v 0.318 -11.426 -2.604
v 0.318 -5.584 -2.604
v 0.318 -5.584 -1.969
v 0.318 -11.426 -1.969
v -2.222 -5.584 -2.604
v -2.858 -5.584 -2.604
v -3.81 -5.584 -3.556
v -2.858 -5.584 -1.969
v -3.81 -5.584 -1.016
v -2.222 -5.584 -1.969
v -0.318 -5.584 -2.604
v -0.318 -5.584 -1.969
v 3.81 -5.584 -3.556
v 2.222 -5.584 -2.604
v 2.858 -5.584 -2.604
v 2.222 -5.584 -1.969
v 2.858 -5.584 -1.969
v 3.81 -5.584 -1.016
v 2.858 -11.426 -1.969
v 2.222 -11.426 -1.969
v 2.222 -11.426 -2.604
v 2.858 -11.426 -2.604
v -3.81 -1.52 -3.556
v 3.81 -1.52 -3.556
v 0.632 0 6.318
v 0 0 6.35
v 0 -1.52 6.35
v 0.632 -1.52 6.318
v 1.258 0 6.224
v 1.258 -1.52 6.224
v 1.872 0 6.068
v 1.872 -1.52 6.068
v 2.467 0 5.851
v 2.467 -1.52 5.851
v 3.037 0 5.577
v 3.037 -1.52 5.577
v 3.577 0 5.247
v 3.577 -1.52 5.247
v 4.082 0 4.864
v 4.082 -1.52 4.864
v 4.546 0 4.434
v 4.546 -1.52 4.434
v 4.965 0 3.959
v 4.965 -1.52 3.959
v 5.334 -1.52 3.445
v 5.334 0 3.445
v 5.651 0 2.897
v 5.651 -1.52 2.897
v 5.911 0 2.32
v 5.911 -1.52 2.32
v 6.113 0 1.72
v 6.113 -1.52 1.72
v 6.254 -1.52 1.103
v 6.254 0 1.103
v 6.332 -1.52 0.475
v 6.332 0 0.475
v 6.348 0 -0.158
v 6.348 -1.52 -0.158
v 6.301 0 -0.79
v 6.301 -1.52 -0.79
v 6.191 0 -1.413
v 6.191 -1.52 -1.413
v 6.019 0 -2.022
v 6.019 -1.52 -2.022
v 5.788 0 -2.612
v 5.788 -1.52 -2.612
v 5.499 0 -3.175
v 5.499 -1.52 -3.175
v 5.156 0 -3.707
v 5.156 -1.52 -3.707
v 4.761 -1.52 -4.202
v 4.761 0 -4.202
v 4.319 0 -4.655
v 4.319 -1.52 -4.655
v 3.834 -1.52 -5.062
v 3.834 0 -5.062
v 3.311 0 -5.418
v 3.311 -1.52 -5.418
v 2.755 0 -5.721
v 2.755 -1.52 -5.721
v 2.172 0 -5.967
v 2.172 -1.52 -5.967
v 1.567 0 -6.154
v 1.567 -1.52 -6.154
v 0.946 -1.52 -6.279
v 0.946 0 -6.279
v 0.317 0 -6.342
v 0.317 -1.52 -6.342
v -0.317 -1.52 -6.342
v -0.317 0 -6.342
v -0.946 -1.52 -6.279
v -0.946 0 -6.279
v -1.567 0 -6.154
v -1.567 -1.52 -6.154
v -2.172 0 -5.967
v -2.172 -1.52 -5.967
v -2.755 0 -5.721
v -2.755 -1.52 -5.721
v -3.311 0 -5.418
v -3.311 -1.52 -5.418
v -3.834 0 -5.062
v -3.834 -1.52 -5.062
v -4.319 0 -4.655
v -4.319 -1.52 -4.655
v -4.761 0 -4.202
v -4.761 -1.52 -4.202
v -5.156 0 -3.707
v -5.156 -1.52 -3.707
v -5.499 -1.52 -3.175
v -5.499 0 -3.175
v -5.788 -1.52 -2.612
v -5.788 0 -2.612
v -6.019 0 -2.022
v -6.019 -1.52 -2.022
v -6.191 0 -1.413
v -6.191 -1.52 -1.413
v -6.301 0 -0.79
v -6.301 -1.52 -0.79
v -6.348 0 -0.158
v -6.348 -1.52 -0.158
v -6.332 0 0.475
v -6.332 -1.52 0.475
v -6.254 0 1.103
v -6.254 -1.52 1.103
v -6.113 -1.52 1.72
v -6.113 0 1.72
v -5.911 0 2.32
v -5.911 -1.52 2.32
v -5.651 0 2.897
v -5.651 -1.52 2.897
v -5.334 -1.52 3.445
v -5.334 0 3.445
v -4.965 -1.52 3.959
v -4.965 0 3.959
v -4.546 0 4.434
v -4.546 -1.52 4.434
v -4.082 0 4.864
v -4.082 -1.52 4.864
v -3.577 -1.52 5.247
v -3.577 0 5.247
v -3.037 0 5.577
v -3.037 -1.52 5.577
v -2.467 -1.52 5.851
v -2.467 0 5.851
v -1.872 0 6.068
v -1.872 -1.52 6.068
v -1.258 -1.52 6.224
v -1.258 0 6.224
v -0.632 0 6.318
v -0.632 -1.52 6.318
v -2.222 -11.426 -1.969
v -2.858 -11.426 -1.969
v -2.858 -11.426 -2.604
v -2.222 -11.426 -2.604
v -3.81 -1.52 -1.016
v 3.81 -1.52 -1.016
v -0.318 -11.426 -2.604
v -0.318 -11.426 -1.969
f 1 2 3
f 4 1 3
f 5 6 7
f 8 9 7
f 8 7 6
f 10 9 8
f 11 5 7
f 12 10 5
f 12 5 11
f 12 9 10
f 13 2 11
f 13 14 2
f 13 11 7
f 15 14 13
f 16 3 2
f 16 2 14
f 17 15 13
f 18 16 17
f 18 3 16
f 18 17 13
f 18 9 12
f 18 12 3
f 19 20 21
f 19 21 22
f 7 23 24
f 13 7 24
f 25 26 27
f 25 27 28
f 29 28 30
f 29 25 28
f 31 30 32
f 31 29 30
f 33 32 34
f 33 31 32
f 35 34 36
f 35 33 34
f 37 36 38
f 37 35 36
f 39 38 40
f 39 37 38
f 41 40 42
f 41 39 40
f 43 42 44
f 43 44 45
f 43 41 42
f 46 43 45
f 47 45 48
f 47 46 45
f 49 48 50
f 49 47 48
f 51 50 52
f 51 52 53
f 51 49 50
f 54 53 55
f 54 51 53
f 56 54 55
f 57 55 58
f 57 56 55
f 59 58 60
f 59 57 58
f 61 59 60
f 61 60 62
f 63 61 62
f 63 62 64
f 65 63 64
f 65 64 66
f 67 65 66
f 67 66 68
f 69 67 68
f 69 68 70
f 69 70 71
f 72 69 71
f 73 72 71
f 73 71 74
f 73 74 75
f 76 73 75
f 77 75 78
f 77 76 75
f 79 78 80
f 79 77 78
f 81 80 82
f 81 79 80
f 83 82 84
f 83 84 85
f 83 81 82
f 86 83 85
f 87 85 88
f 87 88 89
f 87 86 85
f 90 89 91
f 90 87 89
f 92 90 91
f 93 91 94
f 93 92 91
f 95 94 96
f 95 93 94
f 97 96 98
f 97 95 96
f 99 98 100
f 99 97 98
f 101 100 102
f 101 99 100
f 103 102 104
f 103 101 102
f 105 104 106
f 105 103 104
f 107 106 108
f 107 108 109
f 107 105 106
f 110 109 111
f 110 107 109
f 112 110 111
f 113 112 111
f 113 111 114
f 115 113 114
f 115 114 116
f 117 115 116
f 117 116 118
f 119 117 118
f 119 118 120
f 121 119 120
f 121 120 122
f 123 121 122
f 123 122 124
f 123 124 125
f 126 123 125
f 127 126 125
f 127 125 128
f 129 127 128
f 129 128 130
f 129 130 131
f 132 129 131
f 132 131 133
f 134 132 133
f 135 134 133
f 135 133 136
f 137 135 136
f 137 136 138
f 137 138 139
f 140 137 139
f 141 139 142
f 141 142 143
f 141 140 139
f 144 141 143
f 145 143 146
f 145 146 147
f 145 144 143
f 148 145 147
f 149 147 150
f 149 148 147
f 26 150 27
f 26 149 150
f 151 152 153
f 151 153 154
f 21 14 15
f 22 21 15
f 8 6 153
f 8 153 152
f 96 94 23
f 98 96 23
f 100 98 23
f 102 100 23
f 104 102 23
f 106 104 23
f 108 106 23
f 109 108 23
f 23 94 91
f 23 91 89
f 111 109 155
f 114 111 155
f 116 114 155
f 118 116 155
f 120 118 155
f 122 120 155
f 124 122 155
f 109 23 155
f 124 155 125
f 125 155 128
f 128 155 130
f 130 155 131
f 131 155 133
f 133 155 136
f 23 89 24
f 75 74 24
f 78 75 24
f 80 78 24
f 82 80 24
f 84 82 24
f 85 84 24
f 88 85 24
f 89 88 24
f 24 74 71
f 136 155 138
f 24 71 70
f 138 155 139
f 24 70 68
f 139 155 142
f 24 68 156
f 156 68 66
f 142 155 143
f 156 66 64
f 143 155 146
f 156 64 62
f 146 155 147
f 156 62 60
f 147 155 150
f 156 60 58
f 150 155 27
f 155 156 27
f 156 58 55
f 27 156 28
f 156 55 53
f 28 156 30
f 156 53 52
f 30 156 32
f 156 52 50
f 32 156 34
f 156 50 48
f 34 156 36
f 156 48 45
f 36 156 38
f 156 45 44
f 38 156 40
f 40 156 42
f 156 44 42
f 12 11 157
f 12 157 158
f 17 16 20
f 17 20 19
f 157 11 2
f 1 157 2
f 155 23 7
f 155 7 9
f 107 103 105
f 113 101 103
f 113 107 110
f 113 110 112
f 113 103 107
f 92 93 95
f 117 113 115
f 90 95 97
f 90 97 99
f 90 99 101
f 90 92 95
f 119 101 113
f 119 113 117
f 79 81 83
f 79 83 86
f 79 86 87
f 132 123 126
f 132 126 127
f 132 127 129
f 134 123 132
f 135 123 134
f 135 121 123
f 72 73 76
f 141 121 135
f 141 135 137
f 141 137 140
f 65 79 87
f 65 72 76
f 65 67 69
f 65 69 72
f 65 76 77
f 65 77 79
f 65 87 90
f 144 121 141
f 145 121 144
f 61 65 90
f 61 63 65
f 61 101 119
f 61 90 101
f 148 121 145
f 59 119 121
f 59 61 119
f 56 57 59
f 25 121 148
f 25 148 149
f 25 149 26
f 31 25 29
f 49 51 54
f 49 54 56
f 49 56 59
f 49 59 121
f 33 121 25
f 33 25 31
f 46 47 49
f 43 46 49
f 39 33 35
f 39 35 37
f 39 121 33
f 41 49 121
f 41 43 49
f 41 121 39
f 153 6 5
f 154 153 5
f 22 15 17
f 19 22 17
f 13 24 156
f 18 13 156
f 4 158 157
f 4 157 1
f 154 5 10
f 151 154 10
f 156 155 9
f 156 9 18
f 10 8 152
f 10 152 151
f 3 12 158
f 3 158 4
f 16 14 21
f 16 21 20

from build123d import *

# Parameters (mm, degrees)
SKETCH1_R           = 6.35
BOSS_EXTRUDE1_DEPTH = 1.52
SKETCH2_W           = 7.62
SKETCH2_H           = 2.54
BOSS_EXTRUDE2_DEPTH = 4.064
SKETCH3_W           = 0.635
SKETCH3_H           = 0.635
BOSS_EXTRUDE3_DEPTH = 5.842


with BuildPart() as part:
    # Sketch1 → Boss-Extrude1 (new body)
    with BuildSketch(Plane(origin=(0, 0, 0), x_dir=(1, 0, 0), z_dir=(0, 1, 0))):
        with Locations(Location((0, 0, 0), (0, 0, 270))):
            Circle(SKETCH1_R)
    extrude(amount=-BOSS_EXTRUDE1_DEPTH)

    # Sketch2 → Boss-Extrude2 (add)
    with BuildSketch(Plane.XZ.offset(1.52)):
        with Locations((0, -2.286)):
            Rectangle(SKETCH2_W, SKETCH2_H)
    extrude(amount=BOSS_EXTRUDE2_DEPTH)

    # Sketch3 → Boss-Extrude3 (add)
    with BuildSketch(Plane.XZ.offset(5.584)):
        with Locations((0, -2.286)):
            Rectangle(SKETCH3_W, SKETCH3_H)
        with Locations((-2.54, -2.286)):
            Rectangle(SKETCH3_W, SKETCH3_H)
        with Locations((2.54, -2.286)):
            Rectangle(SKETCH3_W, SKETCH3_H)
    extrude(amount=BOSS_EXTRUDE3_DEPTH)


solid = part.part
